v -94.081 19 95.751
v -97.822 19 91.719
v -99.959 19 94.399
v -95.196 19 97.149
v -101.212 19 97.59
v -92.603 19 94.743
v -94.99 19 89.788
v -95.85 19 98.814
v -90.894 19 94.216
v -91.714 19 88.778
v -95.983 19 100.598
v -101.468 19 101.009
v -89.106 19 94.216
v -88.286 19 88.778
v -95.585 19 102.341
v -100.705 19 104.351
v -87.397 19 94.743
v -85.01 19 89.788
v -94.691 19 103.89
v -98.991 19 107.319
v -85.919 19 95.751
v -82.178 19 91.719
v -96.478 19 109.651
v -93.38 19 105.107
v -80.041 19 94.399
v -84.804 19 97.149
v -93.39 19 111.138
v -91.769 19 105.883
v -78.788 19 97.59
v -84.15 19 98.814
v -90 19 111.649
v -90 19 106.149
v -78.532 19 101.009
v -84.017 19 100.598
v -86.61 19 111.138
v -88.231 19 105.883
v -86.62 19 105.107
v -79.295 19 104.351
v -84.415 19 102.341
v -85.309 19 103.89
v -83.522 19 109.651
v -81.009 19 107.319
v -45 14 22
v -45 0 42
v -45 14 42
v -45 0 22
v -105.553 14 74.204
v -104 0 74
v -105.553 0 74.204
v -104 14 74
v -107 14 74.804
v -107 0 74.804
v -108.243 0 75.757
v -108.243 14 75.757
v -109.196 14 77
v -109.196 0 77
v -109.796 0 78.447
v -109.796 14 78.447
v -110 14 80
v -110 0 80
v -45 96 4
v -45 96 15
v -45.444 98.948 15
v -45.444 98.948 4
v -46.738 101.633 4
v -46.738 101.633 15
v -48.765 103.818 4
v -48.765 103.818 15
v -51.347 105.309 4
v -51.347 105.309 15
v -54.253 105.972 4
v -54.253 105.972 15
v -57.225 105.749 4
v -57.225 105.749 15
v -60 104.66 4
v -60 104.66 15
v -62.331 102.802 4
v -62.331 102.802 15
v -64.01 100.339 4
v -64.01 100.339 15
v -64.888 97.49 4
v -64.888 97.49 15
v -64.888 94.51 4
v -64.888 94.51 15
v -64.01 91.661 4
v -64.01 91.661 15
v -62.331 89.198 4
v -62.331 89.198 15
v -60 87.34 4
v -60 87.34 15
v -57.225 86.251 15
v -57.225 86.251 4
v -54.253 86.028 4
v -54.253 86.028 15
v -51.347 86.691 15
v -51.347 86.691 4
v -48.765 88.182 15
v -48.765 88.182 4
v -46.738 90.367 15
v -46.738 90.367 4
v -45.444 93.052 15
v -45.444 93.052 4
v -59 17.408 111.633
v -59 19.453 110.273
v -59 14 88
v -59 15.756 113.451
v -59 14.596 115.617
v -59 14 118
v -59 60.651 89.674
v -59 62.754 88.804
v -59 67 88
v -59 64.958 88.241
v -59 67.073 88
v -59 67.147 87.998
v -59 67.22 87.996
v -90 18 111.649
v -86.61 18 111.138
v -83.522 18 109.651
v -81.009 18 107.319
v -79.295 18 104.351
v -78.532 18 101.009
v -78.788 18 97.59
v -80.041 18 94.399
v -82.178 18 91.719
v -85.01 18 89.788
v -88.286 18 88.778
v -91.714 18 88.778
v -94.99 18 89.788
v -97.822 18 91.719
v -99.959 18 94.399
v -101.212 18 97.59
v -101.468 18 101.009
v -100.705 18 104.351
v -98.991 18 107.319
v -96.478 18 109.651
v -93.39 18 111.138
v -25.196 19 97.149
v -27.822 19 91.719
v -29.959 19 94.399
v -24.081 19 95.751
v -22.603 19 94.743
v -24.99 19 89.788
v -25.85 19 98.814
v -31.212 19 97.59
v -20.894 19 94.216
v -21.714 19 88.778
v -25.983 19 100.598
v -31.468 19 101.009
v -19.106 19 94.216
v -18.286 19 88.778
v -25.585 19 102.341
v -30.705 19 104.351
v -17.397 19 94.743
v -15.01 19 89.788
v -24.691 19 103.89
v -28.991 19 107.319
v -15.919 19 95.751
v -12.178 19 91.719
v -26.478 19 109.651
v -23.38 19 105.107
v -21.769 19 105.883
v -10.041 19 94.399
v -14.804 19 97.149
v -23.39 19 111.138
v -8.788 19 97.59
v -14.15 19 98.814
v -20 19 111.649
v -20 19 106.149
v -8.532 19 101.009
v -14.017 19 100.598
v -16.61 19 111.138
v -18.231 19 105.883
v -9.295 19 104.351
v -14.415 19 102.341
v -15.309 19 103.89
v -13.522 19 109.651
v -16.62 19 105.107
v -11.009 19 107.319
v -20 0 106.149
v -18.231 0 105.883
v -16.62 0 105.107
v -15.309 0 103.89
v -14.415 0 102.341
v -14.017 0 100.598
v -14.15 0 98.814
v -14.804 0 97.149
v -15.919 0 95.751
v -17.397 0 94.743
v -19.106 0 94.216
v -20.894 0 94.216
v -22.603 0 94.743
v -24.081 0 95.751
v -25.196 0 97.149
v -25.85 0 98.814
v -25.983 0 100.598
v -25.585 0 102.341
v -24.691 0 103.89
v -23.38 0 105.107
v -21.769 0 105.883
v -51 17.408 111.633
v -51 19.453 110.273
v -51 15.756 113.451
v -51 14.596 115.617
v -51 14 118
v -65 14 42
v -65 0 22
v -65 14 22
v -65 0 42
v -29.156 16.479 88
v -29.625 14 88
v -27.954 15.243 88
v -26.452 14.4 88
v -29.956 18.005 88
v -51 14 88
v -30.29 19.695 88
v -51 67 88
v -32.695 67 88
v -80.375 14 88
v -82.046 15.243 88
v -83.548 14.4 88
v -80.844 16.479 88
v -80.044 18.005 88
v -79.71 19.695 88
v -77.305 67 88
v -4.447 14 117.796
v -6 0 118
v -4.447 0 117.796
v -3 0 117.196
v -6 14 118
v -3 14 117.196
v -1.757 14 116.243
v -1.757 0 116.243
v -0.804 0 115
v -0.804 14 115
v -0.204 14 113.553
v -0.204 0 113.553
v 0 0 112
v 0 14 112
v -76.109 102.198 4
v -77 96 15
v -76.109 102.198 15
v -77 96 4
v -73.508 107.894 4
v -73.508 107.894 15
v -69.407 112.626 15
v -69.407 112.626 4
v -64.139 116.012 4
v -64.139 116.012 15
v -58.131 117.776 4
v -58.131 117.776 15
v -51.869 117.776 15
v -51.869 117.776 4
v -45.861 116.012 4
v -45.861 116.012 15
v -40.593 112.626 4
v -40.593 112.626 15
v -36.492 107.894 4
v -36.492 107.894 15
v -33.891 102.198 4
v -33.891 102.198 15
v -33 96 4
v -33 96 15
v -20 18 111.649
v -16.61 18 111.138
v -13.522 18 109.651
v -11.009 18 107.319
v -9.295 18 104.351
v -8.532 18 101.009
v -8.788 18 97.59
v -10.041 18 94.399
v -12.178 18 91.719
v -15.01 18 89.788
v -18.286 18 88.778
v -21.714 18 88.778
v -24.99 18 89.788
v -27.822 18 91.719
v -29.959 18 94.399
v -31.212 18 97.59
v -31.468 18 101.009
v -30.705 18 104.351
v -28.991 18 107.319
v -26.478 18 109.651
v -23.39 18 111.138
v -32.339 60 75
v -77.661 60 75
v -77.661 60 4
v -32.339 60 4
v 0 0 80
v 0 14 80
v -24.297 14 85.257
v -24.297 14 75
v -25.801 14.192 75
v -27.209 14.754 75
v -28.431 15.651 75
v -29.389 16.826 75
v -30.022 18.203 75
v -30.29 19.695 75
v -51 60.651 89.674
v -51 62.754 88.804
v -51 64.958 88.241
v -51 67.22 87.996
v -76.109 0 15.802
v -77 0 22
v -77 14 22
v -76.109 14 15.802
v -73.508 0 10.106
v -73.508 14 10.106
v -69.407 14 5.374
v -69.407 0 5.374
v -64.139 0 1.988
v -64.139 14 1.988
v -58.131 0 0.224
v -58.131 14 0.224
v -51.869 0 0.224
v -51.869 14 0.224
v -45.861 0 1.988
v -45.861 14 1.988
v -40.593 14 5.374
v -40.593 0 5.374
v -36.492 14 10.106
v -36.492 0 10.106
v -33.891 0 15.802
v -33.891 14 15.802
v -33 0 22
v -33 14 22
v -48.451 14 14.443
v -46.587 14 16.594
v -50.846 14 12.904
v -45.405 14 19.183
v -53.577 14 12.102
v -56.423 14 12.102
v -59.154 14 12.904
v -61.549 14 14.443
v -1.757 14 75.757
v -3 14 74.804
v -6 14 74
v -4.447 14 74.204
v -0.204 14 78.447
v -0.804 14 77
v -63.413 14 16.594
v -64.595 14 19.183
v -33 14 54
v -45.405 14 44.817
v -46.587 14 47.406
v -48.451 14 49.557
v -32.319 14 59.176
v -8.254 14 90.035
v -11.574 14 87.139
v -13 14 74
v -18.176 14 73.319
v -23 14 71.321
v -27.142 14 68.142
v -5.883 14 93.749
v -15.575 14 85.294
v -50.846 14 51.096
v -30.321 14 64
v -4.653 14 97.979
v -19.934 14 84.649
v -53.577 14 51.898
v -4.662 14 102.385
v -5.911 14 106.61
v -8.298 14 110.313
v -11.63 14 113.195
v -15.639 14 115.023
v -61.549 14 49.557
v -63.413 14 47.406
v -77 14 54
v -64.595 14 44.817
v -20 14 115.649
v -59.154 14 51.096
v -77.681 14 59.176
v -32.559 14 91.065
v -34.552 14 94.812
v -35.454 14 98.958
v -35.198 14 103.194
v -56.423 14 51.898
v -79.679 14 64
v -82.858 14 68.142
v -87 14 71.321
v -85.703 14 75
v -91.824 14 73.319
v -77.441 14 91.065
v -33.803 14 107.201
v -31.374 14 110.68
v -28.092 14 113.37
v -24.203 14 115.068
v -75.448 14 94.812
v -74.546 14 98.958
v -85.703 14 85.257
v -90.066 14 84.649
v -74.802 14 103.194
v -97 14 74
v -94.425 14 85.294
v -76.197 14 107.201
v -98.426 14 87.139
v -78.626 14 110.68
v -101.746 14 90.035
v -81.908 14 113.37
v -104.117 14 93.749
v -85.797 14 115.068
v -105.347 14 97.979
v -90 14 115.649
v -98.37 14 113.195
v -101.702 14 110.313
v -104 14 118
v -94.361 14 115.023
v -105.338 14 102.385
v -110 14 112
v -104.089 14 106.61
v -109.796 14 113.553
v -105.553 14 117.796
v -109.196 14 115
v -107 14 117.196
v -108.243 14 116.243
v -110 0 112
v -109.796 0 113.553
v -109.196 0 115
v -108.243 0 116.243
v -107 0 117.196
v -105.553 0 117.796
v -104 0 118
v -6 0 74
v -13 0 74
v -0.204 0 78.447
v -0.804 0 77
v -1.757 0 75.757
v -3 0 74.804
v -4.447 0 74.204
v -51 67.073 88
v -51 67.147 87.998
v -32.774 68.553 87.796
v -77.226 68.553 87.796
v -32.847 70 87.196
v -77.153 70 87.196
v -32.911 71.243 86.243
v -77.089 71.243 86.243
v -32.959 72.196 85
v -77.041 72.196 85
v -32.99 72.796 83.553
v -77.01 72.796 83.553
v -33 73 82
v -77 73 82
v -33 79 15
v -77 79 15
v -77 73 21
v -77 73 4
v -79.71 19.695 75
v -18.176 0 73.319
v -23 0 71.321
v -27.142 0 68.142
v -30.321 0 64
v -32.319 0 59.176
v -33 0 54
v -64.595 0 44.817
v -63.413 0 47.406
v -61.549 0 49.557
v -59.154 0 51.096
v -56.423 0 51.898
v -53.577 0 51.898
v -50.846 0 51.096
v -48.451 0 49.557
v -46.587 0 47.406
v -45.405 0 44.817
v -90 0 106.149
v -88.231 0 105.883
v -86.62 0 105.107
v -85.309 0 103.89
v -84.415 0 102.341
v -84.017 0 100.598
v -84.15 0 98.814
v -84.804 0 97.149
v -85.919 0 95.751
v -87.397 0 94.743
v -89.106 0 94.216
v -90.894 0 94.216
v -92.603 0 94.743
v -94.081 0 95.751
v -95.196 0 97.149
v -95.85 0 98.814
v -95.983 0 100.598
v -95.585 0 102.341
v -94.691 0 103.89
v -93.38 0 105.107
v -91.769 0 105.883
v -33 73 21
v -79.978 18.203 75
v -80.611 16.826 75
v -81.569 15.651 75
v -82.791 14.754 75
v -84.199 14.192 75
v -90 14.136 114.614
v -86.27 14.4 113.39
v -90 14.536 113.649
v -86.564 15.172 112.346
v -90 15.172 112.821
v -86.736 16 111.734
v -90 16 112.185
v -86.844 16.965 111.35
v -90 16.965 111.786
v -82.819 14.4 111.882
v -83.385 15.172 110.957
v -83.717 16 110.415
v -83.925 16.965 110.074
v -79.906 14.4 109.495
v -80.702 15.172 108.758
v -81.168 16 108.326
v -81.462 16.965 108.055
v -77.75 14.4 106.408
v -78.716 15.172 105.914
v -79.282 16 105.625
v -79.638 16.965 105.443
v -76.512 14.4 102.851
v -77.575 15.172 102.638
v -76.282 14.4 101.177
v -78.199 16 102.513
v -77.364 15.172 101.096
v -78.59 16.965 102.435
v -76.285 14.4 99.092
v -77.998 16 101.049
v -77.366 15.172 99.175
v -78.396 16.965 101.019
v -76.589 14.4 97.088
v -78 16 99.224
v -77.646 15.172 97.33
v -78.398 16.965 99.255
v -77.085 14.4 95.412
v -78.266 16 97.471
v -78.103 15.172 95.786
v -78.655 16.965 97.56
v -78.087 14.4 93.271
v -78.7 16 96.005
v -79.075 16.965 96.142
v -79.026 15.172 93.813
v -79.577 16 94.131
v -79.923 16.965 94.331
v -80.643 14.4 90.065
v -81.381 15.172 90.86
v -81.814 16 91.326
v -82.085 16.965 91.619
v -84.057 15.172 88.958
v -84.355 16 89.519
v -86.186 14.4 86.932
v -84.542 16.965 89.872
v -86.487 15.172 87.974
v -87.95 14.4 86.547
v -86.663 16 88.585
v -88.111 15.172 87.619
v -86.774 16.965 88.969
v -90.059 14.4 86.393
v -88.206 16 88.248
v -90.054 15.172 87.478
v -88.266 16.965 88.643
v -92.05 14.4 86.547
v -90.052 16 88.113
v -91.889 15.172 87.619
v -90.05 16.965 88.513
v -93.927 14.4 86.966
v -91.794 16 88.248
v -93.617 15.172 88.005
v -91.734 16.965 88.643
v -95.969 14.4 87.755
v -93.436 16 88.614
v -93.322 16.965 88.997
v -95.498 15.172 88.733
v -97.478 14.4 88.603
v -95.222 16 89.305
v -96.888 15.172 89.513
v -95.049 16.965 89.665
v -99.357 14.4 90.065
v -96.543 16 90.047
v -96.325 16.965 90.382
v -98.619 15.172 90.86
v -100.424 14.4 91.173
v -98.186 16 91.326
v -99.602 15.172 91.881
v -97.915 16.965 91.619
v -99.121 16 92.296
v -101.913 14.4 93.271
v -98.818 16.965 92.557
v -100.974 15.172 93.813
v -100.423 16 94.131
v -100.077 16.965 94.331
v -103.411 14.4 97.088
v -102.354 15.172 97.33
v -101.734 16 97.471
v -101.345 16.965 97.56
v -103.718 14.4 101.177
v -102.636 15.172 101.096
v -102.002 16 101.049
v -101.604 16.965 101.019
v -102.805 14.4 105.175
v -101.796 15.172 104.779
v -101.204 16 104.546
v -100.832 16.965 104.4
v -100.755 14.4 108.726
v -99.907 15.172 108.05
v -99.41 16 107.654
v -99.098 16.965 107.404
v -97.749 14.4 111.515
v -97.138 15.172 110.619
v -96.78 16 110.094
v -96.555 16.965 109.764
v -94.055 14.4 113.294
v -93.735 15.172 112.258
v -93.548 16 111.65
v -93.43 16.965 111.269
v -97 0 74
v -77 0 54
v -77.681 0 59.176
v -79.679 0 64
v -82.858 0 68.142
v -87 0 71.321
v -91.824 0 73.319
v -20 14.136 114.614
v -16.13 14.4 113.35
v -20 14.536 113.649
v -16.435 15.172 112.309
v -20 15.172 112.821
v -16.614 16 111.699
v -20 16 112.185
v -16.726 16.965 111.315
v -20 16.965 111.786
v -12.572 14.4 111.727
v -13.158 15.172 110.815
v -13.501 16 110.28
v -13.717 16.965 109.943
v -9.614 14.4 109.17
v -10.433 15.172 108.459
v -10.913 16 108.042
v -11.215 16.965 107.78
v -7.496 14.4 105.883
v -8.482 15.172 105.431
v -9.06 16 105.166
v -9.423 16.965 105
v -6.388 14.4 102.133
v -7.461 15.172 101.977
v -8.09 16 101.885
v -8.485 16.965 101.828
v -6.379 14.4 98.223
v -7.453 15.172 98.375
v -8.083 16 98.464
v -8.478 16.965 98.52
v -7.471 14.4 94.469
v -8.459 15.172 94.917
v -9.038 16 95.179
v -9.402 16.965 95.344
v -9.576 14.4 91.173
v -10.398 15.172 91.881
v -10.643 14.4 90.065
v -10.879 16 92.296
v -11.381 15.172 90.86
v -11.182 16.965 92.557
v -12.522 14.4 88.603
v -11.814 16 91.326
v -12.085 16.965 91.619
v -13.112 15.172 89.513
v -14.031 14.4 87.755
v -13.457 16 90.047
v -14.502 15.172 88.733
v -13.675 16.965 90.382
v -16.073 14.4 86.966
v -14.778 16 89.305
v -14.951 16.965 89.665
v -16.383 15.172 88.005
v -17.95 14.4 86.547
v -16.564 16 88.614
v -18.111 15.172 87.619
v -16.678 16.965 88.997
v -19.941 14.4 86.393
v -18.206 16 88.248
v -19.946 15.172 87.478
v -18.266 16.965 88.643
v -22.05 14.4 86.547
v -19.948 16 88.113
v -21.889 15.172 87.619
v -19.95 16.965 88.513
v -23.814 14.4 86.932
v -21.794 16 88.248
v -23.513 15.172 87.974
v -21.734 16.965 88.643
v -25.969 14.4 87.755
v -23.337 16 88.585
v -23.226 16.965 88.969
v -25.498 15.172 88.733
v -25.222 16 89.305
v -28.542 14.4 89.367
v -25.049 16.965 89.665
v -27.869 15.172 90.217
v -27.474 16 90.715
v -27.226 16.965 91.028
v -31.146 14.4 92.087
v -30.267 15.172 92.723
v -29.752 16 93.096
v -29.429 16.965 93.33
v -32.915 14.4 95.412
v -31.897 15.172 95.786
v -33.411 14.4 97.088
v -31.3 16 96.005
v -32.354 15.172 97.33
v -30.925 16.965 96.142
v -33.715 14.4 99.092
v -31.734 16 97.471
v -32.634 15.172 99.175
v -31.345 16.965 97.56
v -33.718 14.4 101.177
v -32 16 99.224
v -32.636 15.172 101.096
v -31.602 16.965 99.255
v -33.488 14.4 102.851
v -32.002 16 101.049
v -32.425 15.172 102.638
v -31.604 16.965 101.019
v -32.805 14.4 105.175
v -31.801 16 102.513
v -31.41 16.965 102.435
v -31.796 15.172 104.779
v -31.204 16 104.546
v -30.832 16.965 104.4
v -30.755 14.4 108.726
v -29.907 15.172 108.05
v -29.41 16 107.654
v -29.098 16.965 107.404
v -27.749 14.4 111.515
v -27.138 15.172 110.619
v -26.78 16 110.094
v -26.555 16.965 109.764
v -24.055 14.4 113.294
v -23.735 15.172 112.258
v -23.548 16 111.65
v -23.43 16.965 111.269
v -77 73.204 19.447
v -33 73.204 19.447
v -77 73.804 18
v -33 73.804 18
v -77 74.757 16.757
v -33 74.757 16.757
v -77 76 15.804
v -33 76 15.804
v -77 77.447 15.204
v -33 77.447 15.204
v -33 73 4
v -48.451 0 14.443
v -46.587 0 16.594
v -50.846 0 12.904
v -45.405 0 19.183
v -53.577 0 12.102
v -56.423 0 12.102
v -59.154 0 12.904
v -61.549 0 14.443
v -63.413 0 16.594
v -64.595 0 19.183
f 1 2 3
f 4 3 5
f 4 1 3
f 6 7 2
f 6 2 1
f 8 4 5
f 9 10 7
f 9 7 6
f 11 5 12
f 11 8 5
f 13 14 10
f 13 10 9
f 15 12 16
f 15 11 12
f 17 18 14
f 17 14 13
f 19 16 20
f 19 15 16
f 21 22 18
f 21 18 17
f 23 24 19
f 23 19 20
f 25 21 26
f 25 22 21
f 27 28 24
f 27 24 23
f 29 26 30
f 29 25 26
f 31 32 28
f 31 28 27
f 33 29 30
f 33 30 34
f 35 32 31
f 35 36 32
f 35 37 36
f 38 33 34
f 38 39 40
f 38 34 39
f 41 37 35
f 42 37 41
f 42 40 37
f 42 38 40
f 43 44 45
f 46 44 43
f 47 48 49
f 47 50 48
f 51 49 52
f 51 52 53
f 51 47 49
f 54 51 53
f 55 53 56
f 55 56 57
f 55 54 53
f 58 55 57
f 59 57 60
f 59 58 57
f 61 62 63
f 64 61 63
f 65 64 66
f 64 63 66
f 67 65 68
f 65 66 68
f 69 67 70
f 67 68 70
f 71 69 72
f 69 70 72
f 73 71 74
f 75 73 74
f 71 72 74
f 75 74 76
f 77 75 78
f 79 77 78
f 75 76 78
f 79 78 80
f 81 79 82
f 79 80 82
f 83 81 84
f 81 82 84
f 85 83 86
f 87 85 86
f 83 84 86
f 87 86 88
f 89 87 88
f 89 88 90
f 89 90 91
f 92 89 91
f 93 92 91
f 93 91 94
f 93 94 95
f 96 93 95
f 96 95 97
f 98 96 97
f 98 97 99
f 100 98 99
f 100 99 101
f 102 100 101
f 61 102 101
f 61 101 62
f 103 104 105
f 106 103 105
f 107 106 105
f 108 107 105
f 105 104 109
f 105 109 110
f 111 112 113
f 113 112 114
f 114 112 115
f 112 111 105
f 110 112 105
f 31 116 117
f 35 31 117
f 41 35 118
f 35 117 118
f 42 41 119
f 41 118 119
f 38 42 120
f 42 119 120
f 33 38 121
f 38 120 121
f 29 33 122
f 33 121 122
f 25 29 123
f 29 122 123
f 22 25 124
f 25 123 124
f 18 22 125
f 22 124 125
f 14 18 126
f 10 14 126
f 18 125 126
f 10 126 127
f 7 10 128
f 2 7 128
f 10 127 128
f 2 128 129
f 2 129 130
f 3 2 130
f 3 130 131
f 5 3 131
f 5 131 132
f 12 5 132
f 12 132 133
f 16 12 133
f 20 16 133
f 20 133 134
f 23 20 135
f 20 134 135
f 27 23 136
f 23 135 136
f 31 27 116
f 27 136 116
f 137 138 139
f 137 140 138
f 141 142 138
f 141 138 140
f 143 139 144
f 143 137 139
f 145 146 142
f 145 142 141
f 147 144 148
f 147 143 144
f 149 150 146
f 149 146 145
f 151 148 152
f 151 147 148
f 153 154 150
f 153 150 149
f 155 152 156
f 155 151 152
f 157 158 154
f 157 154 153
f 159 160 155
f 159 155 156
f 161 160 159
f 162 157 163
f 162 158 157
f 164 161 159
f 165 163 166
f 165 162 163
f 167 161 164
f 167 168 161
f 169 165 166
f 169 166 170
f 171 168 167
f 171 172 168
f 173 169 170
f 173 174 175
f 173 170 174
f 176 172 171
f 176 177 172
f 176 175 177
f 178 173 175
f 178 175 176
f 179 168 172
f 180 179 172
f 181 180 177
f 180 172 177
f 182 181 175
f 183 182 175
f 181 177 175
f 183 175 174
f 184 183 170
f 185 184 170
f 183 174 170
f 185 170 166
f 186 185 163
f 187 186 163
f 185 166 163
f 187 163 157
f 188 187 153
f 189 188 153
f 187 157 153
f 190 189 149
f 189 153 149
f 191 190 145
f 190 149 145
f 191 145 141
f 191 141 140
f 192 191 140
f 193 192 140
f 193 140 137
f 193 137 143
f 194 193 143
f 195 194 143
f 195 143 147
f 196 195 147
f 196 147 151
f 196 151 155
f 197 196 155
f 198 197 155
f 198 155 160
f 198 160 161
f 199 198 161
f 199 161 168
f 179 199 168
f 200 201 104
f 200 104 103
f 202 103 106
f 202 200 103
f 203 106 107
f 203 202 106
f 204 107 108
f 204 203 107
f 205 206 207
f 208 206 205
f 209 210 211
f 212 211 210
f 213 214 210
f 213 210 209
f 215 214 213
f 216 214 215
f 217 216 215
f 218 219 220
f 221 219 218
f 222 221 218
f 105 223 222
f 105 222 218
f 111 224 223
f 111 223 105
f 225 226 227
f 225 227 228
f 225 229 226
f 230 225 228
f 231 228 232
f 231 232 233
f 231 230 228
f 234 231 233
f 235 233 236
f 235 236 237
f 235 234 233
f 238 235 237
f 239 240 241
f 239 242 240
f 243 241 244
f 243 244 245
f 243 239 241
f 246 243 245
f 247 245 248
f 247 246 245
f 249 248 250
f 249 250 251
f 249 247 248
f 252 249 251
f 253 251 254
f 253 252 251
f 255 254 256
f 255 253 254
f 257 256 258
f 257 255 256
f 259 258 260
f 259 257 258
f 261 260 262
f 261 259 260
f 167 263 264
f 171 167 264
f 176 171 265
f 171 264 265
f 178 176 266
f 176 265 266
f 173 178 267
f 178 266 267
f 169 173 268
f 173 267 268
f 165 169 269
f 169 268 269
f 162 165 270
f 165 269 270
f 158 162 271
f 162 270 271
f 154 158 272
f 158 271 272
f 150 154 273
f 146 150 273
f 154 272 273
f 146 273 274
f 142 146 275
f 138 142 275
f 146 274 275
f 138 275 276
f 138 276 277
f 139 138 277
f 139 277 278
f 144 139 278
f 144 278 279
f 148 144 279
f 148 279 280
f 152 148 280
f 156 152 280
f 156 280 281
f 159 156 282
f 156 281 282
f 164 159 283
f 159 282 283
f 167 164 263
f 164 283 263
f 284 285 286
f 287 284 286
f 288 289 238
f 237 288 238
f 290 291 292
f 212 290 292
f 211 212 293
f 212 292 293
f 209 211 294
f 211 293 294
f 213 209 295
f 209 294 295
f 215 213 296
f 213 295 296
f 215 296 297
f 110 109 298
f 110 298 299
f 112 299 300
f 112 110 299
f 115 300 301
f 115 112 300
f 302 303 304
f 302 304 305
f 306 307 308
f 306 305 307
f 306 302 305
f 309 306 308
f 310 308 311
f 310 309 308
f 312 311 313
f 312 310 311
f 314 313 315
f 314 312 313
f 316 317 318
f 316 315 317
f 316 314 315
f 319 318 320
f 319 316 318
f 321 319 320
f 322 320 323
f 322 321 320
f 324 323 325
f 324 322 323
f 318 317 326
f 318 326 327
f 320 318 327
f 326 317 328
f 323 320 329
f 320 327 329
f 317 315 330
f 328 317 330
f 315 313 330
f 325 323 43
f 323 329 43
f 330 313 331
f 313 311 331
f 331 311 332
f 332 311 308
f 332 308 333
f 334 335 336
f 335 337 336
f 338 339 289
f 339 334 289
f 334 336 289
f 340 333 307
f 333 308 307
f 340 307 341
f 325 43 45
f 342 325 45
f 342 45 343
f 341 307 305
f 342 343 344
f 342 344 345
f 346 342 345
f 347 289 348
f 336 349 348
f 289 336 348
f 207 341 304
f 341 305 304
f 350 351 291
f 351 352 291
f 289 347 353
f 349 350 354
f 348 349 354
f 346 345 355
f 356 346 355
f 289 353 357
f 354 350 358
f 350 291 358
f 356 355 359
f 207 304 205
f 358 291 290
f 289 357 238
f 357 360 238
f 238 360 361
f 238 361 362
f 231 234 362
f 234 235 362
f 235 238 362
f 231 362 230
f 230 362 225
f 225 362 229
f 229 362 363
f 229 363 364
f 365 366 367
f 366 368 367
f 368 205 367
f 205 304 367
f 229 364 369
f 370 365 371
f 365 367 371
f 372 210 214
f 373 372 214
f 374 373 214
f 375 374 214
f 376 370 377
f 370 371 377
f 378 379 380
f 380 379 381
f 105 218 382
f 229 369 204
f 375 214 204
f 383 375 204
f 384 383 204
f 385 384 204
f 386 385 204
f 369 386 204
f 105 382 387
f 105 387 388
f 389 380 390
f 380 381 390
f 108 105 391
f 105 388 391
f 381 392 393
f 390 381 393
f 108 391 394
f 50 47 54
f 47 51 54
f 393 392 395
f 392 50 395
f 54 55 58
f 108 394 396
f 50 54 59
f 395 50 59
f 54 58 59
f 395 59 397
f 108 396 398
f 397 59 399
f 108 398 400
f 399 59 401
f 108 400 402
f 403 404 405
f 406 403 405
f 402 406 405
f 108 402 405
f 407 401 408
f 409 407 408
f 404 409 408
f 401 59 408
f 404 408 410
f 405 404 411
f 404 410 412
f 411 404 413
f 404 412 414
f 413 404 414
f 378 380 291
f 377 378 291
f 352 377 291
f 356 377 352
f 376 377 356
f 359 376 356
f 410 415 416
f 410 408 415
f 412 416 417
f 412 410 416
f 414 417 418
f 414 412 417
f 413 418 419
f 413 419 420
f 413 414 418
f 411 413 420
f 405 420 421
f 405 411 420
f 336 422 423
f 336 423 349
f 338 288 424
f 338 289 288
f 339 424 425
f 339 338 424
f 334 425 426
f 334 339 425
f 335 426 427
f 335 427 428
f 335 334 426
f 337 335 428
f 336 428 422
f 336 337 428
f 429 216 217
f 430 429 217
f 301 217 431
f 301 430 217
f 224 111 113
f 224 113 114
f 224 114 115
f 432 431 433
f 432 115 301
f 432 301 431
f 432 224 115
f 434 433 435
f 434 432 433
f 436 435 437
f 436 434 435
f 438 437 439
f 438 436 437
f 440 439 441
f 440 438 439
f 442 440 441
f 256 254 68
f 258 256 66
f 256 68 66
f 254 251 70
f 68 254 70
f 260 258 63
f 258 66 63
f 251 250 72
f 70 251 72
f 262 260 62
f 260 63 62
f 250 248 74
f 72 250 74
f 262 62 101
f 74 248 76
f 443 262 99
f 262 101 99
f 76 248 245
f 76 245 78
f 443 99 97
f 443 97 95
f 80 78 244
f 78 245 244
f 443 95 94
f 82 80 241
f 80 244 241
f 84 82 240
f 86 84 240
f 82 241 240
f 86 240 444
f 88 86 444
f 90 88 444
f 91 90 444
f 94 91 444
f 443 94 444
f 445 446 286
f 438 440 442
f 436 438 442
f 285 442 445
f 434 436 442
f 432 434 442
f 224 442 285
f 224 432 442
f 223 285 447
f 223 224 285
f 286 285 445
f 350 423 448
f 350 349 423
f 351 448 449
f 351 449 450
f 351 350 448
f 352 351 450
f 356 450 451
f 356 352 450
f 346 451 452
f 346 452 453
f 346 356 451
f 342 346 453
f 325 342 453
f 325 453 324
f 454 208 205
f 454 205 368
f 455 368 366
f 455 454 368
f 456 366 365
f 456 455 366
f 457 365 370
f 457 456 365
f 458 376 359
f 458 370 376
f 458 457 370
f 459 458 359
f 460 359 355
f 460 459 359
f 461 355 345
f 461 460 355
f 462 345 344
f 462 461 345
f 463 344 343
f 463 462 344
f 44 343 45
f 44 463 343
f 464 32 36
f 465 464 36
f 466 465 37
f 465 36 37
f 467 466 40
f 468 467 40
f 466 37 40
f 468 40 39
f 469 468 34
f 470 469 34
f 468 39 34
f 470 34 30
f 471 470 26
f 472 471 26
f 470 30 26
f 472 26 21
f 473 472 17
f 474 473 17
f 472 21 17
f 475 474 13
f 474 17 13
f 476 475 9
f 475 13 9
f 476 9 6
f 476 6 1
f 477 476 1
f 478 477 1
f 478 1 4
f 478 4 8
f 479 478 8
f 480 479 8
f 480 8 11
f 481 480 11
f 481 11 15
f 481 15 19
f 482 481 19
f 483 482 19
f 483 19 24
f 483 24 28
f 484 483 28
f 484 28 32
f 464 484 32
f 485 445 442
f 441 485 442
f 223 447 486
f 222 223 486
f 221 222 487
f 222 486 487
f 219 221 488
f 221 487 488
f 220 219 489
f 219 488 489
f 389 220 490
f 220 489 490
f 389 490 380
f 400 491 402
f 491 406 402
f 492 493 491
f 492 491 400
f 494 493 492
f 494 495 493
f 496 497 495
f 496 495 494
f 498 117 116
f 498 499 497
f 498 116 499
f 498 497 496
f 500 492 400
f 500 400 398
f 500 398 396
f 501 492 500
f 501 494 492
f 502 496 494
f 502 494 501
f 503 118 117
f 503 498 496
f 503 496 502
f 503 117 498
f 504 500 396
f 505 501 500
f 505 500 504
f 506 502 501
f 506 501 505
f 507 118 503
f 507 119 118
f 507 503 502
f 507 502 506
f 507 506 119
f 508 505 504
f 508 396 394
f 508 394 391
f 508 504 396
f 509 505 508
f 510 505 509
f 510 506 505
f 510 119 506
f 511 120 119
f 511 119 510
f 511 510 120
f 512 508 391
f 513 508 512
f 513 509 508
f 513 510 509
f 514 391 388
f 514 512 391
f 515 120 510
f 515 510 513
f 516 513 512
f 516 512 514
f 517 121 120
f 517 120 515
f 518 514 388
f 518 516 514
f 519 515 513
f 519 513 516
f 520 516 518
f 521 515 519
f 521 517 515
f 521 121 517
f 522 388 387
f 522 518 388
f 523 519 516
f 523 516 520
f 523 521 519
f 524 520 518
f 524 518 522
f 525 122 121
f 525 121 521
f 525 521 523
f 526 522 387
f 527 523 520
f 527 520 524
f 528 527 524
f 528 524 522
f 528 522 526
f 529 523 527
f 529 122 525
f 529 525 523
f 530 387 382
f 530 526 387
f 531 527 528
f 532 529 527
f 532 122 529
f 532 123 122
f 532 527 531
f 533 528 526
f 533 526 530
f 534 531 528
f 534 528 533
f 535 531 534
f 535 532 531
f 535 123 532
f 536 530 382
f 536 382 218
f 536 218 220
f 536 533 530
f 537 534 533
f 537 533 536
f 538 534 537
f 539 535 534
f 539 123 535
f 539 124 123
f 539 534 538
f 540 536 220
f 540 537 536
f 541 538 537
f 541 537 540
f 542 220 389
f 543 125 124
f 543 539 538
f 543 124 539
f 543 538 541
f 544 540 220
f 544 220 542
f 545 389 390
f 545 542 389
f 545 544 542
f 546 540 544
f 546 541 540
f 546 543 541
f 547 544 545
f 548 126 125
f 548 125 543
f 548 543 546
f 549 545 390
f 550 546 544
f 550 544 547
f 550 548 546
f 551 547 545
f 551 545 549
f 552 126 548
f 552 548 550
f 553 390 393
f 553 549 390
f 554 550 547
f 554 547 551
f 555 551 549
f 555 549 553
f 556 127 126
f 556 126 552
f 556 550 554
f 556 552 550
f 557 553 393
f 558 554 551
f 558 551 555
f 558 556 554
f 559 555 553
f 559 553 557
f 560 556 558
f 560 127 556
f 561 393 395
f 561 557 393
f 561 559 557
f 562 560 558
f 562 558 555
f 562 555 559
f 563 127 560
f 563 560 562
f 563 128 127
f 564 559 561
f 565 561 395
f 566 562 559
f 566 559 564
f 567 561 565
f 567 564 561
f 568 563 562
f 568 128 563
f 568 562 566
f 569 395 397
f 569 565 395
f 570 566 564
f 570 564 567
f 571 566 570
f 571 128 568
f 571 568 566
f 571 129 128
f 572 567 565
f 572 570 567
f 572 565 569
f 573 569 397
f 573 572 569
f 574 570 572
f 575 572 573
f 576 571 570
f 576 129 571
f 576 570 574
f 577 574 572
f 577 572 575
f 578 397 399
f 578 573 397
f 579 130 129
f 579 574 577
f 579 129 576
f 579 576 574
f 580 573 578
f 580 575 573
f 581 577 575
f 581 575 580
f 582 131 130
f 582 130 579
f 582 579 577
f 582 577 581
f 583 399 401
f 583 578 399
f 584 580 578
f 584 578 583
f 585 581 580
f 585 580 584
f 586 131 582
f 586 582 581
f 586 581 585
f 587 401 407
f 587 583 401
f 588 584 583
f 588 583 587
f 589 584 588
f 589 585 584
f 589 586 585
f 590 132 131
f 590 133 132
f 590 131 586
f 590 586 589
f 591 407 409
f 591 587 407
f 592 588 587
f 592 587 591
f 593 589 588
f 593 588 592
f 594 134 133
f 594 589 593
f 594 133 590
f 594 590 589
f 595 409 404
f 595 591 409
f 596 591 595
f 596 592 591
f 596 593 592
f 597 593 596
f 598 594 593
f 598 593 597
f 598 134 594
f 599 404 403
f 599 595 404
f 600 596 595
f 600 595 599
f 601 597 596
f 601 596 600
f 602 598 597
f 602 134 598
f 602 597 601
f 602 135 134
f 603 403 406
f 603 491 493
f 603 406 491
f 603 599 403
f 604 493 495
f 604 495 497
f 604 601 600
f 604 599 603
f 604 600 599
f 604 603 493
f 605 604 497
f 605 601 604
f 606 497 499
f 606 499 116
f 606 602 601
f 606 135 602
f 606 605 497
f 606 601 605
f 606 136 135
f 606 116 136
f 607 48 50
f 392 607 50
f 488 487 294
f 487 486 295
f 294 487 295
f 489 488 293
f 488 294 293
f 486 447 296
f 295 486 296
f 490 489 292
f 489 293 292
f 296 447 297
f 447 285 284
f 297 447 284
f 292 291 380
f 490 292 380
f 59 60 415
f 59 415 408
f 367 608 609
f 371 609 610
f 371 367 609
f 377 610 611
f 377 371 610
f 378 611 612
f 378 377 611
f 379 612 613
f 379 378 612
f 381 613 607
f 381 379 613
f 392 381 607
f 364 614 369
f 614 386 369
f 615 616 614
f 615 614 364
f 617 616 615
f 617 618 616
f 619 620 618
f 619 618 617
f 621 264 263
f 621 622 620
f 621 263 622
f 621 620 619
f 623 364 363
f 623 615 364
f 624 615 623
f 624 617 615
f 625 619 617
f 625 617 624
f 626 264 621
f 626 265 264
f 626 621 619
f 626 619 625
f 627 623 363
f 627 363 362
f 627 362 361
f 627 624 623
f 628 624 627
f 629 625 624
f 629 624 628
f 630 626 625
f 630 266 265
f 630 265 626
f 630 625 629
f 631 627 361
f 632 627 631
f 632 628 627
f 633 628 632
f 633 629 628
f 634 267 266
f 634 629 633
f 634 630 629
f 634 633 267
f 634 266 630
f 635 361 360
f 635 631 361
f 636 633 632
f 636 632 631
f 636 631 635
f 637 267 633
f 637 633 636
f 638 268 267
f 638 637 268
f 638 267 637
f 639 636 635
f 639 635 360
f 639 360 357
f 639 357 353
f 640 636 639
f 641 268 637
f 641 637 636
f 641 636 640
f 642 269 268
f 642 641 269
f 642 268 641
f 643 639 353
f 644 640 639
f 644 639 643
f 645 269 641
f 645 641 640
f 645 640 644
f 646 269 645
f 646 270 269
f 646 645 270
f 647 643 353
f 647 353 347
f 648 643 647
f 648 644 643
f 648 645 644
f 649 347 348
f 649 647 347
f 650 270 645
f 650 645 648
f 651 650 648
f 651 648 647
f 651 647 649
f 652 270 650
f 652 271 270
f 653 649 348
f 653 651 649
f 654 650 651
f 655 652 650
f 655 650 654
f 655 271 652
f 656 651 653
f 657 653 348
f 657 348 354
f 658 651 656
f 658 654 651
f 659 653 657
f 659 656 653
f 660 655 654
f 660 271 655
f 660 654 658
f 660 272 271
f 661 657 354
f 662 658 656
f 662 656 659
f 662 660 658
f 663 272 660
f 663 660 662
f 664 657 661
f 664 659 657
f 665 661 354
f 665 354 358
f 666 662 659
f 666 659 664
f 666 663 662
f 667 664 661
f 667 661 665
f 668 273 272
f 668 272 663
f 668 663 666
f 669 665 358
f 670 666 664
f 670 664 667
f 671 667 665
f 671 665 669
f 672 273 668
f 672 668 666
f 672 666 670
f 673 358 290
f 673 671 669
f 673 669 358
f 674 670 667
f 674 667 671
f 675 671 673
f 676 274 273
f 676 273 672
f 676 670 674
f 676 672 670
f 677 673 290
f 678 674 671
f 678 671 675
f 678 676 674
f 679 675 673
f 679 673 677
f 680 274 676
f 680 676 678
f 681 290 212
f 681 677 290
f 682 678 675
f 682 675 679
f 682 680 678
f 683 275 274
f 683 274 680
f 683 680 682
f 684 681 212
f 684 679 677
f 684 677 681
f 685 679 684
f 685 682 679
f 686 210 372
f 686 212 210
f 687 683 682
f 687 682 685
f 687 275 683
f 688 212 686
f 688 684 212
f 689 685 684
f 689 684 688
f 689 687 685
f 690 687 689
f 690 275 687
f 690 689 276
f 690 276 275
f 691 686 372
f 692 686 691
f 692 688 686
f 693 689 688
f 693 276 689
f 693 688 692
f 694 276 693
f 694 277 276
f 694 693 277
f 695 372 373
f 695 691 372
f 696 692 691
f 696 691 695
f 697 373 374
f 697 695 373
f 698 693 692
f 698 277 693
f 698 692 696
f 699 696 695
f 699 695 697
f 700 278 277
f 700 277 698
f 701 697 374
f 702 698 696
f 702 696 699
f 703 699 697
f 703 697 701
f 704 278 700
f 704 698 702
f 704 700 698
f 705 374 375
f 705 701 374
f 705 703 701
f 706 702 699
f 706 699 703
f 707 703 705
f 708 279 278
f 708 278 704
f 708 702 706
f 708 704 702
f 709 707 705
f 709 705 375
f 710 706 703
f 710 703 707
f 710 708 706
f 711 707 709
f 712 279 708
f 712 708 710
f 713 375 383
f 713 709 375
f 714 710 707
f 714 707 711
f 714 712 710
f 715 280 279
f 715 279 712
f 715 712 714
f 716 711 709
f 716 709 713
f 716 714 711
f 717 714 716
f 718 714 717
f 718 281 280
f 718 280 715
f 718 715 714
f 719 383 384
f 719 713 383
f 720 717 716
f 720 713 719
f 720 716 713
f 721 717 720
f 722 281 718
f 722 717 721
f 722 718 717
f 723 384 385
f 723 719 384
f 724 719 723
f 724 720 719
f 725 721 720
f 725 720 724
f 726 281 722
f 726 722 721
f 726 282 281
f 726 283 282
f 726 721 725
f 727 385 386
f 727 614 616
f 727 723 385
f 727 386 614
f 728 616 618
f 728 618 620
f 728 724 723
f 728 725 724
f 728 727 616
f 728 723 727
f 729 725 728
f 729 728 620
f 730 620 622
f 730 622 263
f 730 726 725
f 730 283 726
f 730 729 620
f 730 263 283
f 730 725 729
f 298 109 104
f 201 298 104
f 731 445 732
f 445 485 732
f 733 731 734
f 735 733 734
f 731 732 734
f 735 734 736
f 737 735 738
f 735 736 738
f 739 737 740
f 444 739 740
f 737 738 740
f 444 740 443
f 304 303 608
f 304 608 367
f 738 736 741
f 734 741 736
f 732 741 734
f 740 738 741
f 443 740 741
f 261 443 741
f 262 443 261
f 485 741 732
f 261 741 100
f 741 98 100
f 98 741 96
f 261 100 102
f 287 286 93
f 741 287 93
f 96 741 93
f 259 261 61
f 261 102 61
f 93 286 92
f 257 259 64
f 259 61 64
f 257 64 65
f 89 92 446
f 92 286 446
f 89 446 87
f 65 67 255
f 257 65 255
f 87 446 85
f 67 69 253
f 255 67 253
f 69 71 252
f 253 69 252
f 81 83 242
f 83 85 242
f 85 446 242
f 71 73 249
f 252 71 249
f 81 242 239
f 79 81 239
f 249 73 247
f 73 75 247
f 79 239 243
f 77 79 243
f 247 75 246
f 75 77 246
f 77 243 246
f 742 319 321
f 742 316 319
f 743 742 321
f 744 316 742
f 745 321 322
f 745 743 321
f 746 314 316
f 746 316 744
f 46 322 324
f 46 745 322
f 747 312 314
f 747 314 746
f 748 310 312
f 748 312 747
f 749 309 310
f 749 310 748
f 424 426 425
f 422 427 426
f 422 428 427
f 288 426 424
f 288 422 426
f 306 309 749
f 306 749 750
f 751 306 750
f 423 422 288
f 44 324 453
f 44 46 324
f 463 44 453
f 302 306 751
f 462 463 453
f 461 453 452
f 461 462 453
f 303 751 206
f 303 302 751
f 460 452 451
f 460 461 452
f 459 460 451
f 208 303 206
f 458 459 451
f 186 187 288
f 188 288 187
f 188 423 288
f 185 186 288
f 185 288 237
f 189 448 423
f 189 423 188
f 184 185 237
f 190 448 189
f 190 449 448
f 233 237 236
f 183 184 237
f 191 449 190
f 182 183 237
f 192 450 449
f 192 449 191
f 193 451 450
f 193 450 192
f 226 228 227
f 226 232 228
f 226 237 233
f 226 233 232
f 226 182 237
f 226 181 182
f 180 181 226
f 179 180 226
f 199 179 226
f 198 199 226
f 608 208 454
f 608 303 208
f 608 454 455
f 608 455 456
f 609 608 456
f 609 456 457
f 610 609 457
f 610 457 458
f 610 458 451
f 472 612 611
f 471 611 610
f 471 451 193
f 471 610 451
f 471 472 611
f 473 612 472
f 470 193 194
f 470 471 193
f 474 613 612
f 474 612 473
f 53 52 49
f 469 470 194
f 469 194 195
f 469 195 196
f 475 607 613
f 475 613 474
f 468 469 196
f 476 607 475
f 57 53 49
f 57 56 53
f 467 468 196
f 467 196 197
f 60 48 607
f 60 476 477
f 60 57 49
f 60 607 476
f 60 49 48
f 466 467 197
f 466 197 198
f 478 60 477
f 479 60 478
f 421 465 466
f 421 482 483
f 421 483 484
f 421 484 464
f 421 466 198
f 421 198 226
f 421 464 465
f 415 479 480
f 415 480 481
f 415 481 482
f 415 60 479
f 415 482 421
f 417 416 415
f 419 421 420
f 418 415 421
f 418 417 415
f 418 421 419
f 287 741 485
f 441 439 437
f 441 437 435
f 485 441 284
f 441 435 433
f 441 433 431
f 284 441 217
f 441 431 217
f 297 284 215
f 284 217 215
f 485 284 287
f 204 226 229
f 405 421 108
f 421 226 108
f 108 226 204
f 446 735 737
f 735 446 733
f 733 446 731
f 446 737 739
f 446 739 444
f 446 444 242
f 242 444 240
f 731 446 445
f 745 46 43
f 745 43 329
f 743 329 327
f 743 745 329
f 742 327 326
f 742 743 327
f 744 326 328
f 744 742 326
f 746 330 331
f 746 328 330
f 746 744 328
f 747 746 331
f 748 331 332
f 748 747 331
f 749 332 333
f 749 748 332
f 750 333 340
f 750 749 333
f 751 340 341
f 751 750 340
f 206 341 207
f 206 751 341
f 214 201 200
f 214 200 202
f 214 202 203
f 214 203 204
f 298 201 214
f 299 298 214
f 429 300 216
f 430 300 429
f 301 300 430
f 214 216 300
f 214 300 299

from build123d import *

# Parameters (mm, degrees)
ESTRUSIONE_ESTRUSIONE2_DEPTH = 55
NERVATURA1_REACH             = 177.707
SCHIZZO2_WALL_W              = 409.315984862
SCHIZZO2_WALL_H              = 4
SCHIZZO3_W                   = 84
SCHIZZO3_H                   = 104
TAGLIO_ESTRUSIONE1_DEPTH     = 30
SCHIZZO4_W                   = 74
SCHIZZO4_H                   = 14
TAGLIO_ESTRUSIONE2_DEPTH     = 33
SPECCHIA2_START              = -77
SPECCHIA2_DEPTH              = 22
SPECCHIA2_START_2            = -110
SPECCHIA2_2_OUTLINE_W        = 14
SPECCHIA2_2_OUTLINE_H        = 44
SPECCHIA2_2_DEPTH            = 33
SPECCHIA2_START_3            = -80
SPECCHIA2_3_DEPTH            = 3
SPECCHIA2_START_4            = -59
SPECCHIA2_4_DEPTH            = 4
RACCORDO1_RADIUS             = 22
RACCORDO1_LENGTH             = 14
RACCORDO3_R                  = 20
RACCORDO4_R                  = 6
TAGLIO_ESTRUSIONE3_DEPTH     = 184.760713973
SCHIZZO7_W                   = 3
SCHIZZO7_H                   = 45
TAGLIO_ESTRUSIONE4_DEPTH     = 192.397492147
RACCORDO11_RADIUS            = 22
RACCORDO11_LENGTH            = 11
RACCORDO12_R                 = 6
RACCORDO13_R                 = 16
RACCORDO15_R                 = 10
SCHIZZO8_R                   = 10
TAGLIO_ESTRUSIONE5_DEPTH     = 192.397492147
SCHIZZO9_R                   = 11.5
ESTRUSIONE_ESTRUSIONE3_DEPTH = 5
SCHIZZO10_R                  = 6
TAGLIO_ESTRUSIONE6_DEPTH     = 190.274932307
TAGLIO_ESTRUSIONE7_REACH     = 201.87
RACCORDO17_R                 = 4
RACCORDO18_START             = 75
RACCORDO18_DEPTH             = 13


with BuildPart() as part:
    # Schizzo1 → Estrusione-Estrusione2 (new body)
    with BuildSketch(Plane(origin=(0, 0, 0), x_dir=(0, 0, -1), z_dir=(1, 0, 0))):
        Polygon((0, 0), (-118, 0), (-118, 14), (-88, 14), (-88, 73), (-15, 73), (-15, 118), (-4, 118), (-4, 60), (-75, 60), (-75, 14), (0, 14), align=None)
    extrude(amount=-ESTRUSIONE_ESTRUSIONE2_DEPTH)

    # Schizzo2 wall → Nervatura1 (add, up to next)
    with BuildSketch(Plane(origin=(-55, 39, 100.5), x_dir=(0, -0.894427191, 0.4472135955), z_dir=(0, 0.4472135955, 0.894427191)), mode=Mode.PRIVATE) as nervatura1_sk1:
        with Locations((0, 2)):
            Rectangle(SCHIZZO2_WALL_W, SCHIZZO2_WALL_H)
    nervatura1_tool1 = extrude(nervatura1_sk1.sketch, amount=-NERVATURA1_REACH, mode=Mode.PRIVATE) - part.part
    add(nervatura1_tool1.solids().sort_by_distance((-55, 39, 100.5))[0])

    # Schizzo3 → Taglio-Estrusione1 (cut)
    with BuildSketch(Plane(origin=(0, 0, 0), x_dir=(0, 0, -1), z_dir=(1, 0, 0))):
        with Locations((-46, 66)):
            Rectangle(SCHIZZO3_W, SCHIZZO3_H)
    extrude(amount=-TAGLIO_ESTRUSIONE1_DEPTH, mode=Mode.SUBTRACT)

    # Schizzo4 → Taglio-Estrusione2 (cut)
    with BuildSketch(Plane(origin=(0, 0, 0), x_dir=(0, 0, -1), z_dir=(1, 0, 0))):
        with Locations((-37, 7)):
            Rectangle(SCHIZZO4_W, SCHIZZO4_H)
    extrude(amount=-TAGLIO_ESTRUSIONE2_DEPTH, mode=Mode.SUBTRACT)

    # Specchia2: read off the stored shape, not the designer's step
    # Specchia2 outline → Specchia2 (add)
    with BuildSketch(Plane.YZ.offset(SPECCHIA2_START)):
        Polygon((0, 0), (14, 0), (14, 75), (60, 75), (60, 4), (118, 4), (118, 15), (73, 15), (73, 88), (14, 88), (14, 118), (0, 118), align=None)
    extrude(amount=SPECCHIA2_DEPTH)

    # Specchia2 2 outline → Specchia2 2 (add)
    with BuildSketch(Plane.YZ.offset(SPECCHIA2_START_2)):
        with Locations((7, 96)):
            Rectangle(SPECCHIA2_2_OUTLINE_W, SPECCHIA2_2_OUTLINE_H)
    extrude(amount=SPECCHIA2_2_DEPTH)

    # Specchia2 3 outline → Specchia2 3 (add)
    with BuildSketch(Plane.YZ.offset(SPECCHIA2_START_3)):
        Polygon((14, 88), (14, 75), (60, 75), (60, 4), (118, 4), (118, 15), (73, 15), (73, 88), align=None)
    extrude(amount=SPECCHIA2_3_DEPTH)

    # Specchia2 4 outline → Specchia2 4 (add)
    with BuildSketch(Plane.YZ.offset(SPECCHIA2_START_4)):
        Polygon((14, 113), (14, 88), (64, 88), align=None)
    extrude(amount=SPECCHIA2_4_DEPTH)

    # Raccordo1: full round fillet: the end face becomes a half cylinder, R = half its width
    raccordo1_face = Plane((-55, 7, 0), x_dir=(0, -1, 0), z_dir=(0, 0, -1))  # on the end face: x along it, z out of the body
    raccordo1_slab = raccordo1_face.offset(-RACCORDO1_RADIUS / 2) * Box(RACCORDO1_LENGTH, 2 * RACCORDO1_RADIUS, RACCORDO1_RADIUS, mode=Mode.PRIVATE)  # the body's end, R deep
    raccordo1_round = Plane((-55, 7, 22), x_dir=(0, 0, -1), z_dir=(0, -1, 0)) * Cylinder(RACCORDO1_RADIUS, RACCORDO1_LENGTH, mode=Mode.PRIVATE)  # its axis R under the face
    add(raccordo1_slab - raccordo1_round, mode=Mode.SUBTRACT)

    # Raccordo3
    raccordo3_edges = [part.edges().sort_by_distance(p)[0] for p in [
        (-33, 7, 74),
        (-77, 7, 74),
    ]]
    fillet(raccordo3_edges, radius=RACCORDO3_R)

    # Raccordo4
    raccordo4_edges = [part.edges().sort_by_distance(p)[0] for p in [
        (0, 7, 74),
        (-110, 7, 118),
        (0, 7, 118),
        (-110, 7, 74),
    ]]
    fillet(raccordo4_edges, radius=RACCORDO4_R)

    # Schizzo6 → Taglio-Estrusione3 (cut, through all)
    with BuildSketch(Plane.XY.offset(88)):
        Polygon((-33, 73), (-30, 14), (-30, 73), align=None)
        Polygon((-80, 14), (-80, 73), (-77, 73), align=None)
    extrude(amount=-TAGLIO_ESTRUSIONE3_DEPTH, mode=Mode.SUBTRACT)

    # Schizzo7 → Taglio-Estrusione4 (cut, through all)
    with BuildSketch(Plane.XY.offset(15)):
        with Locations((-31.5, 95.5)):
            Rectangle(SCHIZZO7_W, SCHIZZO7_H)
        with Locations((-78.5, 95.5)):
            Rectangle(SCHIZZO7_W, SCHIZZO7_H)
    extrude(amount=-TAGLIO_ESTRUSIONE4_DEPTH, mode=Mode.SUBTRACT)

    # Raccordo11: full round fillet: the end face becomes a half cylinder, R = half its width
    raccordo11_face = Plane((-55, 118, 9.5), x_dir=(0, 0, -1), z_dir=(0, 1, 0))  # on the end face: x along it, z out of the body
    raccordo11_slab = raccordo11_face.offset(-RACCORDO11_RADIUS / 2) * Box(RACCORDO11_LENGTH, 2 * RACCORDO11_RADIUS, RACCORDO11_RADIUS, mode=Mode.PRIVATE)  # the body's end, R deep
    raccordo11_round = Plane((-55, 96, 9.5), x_dir=(0, 1, 0), z_dir=(0, 0, -1)) * Cylinder(RACCORDO11_RADIUS, RACCORDO11_LENGTH, mode=Mode.PRIVATE)  # its axis R under the face
    add(raccordo11_slab - raccordo11_round, mode=Mode.SUBTRACT)

    # Raccordo12
    raccordo12_edges = [part.edges().sort_by_distance(p)[0] for p in [
        (-55, 73, 15),
        (-55, 73, 88),
    ]]
    fillet(raccordo12_edges, radius=RACCORDO12_R)

    # Raccordo13
    # the kernel refuses this fillet: 16 mm, written as the material it adds along each edge
    with BuildSketch(Plane(origin=(-59, 64, 88), x_dir=(7.107647619401389e-15, 0.9999992149494827, -0.0012530364791798036), z_dir=(1, 0, 0))) as raccordo13_piece_1:
        with BuildLine():
            CenterArc((3.78664302, 15.989963147), RACCORDO13_R, 243.506742544, 24.463710432)
            Line((-3.350836892, 1.670173327), (-4.064584883, 0.238194345))
            Line((-4.064584883, 0.238194345), (-0.713747991, -1.431978982))
            Line((-0.713747991, -1.431978982), (0.002004858, -1.599998744))
            ThreePointArc((0.002004858, -1.599998744), (3.002002503, -1.596239634), (3.163341295, -1.598996315))
            Line((3.163341295, -1.598996315), (3.220005088, 0))
        make_face()
    extrude(amount=8)

    # Raccordo15
    # the kernel refuses this fillet: 10 mm, written as the material it adds along each edge
    with BuildSketch(Plane(origin=(-51, 14, 113), x_dir=(0, 0, 1), z_dir=(-1, 0, 0))) as raccordo15_piece_1:
        with BuildLine():
            CenterArc((6.217538244, 9.925603288), RACCORDO15_R, 206.565051177, 56.441617235)
            Line((-2.726733666, 5.453467333), (-2.905619105, 5.364024614))
            Line((-2.905619105, 5.364024614), (-0.178885438, -0.089442719))
            Line((-0.178885438, -0.089442719), (0, -0.2))
            ThreePointArc((0, -0.2), (2.5, -0.2), (4.975649235, -0.198512066))
            Line((4.975649235, -0.198512066), (5, 0))
        make_face()
    extrude(amount=8)

    # Schizzo8 → Taglio-Estrusione5 (cut, through all)
    with BuildSketch(Plane.XY.offset(15)):
        with Locations((-55, 96)):
            Circle(SCHIZZO8_R)
    extrude(amount=-TAGLIO_ESTRUSIONE5_DEPTH, mode=Mode.SUBTRACT)

    # Schizzo9 → Estrusione-Estrusione3 (add)
    with BuildSketch(Plane(origin=(0, 14, 0), x_dir=(1, 0, 0), z_dir=(0, 1, 0))):
        with Locations(Location((-90, -100.149267902, 0), (0, 0, 270))):
            Circle(SCHIZZO9_R)
        with Locations(Location((-20, -100.149267902, 0), (0, 0, 270))):
            Circle(SCHIZZO9_R)
    extrude(amount=ESTRUSIONE_ESTRUSIONE3_DEPTH)

    # Schizzo10 → Taglio-Estrusione6 (cut, through all)
    with BuildSketch(Plane(origin=(0, 19, 0), x_dir=(1, 0, 0), z_dir=(0, 1, 0))):
        with Locations(Location((-90, -100.149267902, 0), (0, 0, 270))):
            Circle(SCHIZZO10_R)
        with Locations(Location((-20, -100.149267902, 0), (0, 0, 270))):
            Circle(SCHIZZO10_R)
    extrude(amount=-TAGLIO_ESTRUSIONE6_DEPTH, mode=Mode.SUBTRACT)

    # Schizzo11 → Taglio-Estrusione7 (cut, up to next)
    with BuildSketch(Plane.XZ, mode=Mode.PRIVATE) as taglio_estrusione7_sk1:
        with BuildLine():
            Line((-65, 22), (-65, 42))
            ThreePointArc((-65, 42), (-55, 52), (-45, 42))
            Line((-45, 42), (-45, 22))
            ThreePointArc((-45, 22), (-55, 12), (-65, 22))
        make_face()
    taglio_estrusione7_tool1 = extrude(taglio_estrusione7_sk1.sketch, amount=-TAGLIO_ESTRUSIONE7_REACH, mode=Mode.PRIVATE) & part.part
    add(taglio_estrusione7_tool1.solids().sort_by_distance((-55, 0, 32))[0], mode=Mode.SUBTRACT)

    # Raccordo17
    raccordo17_edges = [part.edges().sort_by_distance(p)[0] for p in [
        (-90, 14, 88.649267902),
        (-20, 14, 88.649267902),
    ]]
    fillet(raccordo17_edges, radius=RACCORDO17_R)

    # Raccordo18: read off the stored shape, not the designer's step
    # Raccordo18 outline → Raccordo18 (add)
    with BuildSketch(Plane.XY.offset(RACCORDO18_START)):
        with BuildLine():
            Line((-80, 14), (-79.710408023, 19.695308884))
            ThreePointArc((-79.710408023, 19.695308884), (-81.56915401, 15.650968689), (-85.702666639, 14))
            Line((-85.702666639, 14), (-80, 14))
        make_face()
        with BuildLine():
            Line((-30.289591977, 19.695308884), (-30, 14))
            Line((-30, 14), (-24.297333361, 14))
            ThreePointArc((-24.297333361, 14), (-28.43084599, 15.650968689), (-30.289591977, 19.695308884))
        make_face()
    extrude(amount=RACCORDO18_DEPTH)


solid = part.part
